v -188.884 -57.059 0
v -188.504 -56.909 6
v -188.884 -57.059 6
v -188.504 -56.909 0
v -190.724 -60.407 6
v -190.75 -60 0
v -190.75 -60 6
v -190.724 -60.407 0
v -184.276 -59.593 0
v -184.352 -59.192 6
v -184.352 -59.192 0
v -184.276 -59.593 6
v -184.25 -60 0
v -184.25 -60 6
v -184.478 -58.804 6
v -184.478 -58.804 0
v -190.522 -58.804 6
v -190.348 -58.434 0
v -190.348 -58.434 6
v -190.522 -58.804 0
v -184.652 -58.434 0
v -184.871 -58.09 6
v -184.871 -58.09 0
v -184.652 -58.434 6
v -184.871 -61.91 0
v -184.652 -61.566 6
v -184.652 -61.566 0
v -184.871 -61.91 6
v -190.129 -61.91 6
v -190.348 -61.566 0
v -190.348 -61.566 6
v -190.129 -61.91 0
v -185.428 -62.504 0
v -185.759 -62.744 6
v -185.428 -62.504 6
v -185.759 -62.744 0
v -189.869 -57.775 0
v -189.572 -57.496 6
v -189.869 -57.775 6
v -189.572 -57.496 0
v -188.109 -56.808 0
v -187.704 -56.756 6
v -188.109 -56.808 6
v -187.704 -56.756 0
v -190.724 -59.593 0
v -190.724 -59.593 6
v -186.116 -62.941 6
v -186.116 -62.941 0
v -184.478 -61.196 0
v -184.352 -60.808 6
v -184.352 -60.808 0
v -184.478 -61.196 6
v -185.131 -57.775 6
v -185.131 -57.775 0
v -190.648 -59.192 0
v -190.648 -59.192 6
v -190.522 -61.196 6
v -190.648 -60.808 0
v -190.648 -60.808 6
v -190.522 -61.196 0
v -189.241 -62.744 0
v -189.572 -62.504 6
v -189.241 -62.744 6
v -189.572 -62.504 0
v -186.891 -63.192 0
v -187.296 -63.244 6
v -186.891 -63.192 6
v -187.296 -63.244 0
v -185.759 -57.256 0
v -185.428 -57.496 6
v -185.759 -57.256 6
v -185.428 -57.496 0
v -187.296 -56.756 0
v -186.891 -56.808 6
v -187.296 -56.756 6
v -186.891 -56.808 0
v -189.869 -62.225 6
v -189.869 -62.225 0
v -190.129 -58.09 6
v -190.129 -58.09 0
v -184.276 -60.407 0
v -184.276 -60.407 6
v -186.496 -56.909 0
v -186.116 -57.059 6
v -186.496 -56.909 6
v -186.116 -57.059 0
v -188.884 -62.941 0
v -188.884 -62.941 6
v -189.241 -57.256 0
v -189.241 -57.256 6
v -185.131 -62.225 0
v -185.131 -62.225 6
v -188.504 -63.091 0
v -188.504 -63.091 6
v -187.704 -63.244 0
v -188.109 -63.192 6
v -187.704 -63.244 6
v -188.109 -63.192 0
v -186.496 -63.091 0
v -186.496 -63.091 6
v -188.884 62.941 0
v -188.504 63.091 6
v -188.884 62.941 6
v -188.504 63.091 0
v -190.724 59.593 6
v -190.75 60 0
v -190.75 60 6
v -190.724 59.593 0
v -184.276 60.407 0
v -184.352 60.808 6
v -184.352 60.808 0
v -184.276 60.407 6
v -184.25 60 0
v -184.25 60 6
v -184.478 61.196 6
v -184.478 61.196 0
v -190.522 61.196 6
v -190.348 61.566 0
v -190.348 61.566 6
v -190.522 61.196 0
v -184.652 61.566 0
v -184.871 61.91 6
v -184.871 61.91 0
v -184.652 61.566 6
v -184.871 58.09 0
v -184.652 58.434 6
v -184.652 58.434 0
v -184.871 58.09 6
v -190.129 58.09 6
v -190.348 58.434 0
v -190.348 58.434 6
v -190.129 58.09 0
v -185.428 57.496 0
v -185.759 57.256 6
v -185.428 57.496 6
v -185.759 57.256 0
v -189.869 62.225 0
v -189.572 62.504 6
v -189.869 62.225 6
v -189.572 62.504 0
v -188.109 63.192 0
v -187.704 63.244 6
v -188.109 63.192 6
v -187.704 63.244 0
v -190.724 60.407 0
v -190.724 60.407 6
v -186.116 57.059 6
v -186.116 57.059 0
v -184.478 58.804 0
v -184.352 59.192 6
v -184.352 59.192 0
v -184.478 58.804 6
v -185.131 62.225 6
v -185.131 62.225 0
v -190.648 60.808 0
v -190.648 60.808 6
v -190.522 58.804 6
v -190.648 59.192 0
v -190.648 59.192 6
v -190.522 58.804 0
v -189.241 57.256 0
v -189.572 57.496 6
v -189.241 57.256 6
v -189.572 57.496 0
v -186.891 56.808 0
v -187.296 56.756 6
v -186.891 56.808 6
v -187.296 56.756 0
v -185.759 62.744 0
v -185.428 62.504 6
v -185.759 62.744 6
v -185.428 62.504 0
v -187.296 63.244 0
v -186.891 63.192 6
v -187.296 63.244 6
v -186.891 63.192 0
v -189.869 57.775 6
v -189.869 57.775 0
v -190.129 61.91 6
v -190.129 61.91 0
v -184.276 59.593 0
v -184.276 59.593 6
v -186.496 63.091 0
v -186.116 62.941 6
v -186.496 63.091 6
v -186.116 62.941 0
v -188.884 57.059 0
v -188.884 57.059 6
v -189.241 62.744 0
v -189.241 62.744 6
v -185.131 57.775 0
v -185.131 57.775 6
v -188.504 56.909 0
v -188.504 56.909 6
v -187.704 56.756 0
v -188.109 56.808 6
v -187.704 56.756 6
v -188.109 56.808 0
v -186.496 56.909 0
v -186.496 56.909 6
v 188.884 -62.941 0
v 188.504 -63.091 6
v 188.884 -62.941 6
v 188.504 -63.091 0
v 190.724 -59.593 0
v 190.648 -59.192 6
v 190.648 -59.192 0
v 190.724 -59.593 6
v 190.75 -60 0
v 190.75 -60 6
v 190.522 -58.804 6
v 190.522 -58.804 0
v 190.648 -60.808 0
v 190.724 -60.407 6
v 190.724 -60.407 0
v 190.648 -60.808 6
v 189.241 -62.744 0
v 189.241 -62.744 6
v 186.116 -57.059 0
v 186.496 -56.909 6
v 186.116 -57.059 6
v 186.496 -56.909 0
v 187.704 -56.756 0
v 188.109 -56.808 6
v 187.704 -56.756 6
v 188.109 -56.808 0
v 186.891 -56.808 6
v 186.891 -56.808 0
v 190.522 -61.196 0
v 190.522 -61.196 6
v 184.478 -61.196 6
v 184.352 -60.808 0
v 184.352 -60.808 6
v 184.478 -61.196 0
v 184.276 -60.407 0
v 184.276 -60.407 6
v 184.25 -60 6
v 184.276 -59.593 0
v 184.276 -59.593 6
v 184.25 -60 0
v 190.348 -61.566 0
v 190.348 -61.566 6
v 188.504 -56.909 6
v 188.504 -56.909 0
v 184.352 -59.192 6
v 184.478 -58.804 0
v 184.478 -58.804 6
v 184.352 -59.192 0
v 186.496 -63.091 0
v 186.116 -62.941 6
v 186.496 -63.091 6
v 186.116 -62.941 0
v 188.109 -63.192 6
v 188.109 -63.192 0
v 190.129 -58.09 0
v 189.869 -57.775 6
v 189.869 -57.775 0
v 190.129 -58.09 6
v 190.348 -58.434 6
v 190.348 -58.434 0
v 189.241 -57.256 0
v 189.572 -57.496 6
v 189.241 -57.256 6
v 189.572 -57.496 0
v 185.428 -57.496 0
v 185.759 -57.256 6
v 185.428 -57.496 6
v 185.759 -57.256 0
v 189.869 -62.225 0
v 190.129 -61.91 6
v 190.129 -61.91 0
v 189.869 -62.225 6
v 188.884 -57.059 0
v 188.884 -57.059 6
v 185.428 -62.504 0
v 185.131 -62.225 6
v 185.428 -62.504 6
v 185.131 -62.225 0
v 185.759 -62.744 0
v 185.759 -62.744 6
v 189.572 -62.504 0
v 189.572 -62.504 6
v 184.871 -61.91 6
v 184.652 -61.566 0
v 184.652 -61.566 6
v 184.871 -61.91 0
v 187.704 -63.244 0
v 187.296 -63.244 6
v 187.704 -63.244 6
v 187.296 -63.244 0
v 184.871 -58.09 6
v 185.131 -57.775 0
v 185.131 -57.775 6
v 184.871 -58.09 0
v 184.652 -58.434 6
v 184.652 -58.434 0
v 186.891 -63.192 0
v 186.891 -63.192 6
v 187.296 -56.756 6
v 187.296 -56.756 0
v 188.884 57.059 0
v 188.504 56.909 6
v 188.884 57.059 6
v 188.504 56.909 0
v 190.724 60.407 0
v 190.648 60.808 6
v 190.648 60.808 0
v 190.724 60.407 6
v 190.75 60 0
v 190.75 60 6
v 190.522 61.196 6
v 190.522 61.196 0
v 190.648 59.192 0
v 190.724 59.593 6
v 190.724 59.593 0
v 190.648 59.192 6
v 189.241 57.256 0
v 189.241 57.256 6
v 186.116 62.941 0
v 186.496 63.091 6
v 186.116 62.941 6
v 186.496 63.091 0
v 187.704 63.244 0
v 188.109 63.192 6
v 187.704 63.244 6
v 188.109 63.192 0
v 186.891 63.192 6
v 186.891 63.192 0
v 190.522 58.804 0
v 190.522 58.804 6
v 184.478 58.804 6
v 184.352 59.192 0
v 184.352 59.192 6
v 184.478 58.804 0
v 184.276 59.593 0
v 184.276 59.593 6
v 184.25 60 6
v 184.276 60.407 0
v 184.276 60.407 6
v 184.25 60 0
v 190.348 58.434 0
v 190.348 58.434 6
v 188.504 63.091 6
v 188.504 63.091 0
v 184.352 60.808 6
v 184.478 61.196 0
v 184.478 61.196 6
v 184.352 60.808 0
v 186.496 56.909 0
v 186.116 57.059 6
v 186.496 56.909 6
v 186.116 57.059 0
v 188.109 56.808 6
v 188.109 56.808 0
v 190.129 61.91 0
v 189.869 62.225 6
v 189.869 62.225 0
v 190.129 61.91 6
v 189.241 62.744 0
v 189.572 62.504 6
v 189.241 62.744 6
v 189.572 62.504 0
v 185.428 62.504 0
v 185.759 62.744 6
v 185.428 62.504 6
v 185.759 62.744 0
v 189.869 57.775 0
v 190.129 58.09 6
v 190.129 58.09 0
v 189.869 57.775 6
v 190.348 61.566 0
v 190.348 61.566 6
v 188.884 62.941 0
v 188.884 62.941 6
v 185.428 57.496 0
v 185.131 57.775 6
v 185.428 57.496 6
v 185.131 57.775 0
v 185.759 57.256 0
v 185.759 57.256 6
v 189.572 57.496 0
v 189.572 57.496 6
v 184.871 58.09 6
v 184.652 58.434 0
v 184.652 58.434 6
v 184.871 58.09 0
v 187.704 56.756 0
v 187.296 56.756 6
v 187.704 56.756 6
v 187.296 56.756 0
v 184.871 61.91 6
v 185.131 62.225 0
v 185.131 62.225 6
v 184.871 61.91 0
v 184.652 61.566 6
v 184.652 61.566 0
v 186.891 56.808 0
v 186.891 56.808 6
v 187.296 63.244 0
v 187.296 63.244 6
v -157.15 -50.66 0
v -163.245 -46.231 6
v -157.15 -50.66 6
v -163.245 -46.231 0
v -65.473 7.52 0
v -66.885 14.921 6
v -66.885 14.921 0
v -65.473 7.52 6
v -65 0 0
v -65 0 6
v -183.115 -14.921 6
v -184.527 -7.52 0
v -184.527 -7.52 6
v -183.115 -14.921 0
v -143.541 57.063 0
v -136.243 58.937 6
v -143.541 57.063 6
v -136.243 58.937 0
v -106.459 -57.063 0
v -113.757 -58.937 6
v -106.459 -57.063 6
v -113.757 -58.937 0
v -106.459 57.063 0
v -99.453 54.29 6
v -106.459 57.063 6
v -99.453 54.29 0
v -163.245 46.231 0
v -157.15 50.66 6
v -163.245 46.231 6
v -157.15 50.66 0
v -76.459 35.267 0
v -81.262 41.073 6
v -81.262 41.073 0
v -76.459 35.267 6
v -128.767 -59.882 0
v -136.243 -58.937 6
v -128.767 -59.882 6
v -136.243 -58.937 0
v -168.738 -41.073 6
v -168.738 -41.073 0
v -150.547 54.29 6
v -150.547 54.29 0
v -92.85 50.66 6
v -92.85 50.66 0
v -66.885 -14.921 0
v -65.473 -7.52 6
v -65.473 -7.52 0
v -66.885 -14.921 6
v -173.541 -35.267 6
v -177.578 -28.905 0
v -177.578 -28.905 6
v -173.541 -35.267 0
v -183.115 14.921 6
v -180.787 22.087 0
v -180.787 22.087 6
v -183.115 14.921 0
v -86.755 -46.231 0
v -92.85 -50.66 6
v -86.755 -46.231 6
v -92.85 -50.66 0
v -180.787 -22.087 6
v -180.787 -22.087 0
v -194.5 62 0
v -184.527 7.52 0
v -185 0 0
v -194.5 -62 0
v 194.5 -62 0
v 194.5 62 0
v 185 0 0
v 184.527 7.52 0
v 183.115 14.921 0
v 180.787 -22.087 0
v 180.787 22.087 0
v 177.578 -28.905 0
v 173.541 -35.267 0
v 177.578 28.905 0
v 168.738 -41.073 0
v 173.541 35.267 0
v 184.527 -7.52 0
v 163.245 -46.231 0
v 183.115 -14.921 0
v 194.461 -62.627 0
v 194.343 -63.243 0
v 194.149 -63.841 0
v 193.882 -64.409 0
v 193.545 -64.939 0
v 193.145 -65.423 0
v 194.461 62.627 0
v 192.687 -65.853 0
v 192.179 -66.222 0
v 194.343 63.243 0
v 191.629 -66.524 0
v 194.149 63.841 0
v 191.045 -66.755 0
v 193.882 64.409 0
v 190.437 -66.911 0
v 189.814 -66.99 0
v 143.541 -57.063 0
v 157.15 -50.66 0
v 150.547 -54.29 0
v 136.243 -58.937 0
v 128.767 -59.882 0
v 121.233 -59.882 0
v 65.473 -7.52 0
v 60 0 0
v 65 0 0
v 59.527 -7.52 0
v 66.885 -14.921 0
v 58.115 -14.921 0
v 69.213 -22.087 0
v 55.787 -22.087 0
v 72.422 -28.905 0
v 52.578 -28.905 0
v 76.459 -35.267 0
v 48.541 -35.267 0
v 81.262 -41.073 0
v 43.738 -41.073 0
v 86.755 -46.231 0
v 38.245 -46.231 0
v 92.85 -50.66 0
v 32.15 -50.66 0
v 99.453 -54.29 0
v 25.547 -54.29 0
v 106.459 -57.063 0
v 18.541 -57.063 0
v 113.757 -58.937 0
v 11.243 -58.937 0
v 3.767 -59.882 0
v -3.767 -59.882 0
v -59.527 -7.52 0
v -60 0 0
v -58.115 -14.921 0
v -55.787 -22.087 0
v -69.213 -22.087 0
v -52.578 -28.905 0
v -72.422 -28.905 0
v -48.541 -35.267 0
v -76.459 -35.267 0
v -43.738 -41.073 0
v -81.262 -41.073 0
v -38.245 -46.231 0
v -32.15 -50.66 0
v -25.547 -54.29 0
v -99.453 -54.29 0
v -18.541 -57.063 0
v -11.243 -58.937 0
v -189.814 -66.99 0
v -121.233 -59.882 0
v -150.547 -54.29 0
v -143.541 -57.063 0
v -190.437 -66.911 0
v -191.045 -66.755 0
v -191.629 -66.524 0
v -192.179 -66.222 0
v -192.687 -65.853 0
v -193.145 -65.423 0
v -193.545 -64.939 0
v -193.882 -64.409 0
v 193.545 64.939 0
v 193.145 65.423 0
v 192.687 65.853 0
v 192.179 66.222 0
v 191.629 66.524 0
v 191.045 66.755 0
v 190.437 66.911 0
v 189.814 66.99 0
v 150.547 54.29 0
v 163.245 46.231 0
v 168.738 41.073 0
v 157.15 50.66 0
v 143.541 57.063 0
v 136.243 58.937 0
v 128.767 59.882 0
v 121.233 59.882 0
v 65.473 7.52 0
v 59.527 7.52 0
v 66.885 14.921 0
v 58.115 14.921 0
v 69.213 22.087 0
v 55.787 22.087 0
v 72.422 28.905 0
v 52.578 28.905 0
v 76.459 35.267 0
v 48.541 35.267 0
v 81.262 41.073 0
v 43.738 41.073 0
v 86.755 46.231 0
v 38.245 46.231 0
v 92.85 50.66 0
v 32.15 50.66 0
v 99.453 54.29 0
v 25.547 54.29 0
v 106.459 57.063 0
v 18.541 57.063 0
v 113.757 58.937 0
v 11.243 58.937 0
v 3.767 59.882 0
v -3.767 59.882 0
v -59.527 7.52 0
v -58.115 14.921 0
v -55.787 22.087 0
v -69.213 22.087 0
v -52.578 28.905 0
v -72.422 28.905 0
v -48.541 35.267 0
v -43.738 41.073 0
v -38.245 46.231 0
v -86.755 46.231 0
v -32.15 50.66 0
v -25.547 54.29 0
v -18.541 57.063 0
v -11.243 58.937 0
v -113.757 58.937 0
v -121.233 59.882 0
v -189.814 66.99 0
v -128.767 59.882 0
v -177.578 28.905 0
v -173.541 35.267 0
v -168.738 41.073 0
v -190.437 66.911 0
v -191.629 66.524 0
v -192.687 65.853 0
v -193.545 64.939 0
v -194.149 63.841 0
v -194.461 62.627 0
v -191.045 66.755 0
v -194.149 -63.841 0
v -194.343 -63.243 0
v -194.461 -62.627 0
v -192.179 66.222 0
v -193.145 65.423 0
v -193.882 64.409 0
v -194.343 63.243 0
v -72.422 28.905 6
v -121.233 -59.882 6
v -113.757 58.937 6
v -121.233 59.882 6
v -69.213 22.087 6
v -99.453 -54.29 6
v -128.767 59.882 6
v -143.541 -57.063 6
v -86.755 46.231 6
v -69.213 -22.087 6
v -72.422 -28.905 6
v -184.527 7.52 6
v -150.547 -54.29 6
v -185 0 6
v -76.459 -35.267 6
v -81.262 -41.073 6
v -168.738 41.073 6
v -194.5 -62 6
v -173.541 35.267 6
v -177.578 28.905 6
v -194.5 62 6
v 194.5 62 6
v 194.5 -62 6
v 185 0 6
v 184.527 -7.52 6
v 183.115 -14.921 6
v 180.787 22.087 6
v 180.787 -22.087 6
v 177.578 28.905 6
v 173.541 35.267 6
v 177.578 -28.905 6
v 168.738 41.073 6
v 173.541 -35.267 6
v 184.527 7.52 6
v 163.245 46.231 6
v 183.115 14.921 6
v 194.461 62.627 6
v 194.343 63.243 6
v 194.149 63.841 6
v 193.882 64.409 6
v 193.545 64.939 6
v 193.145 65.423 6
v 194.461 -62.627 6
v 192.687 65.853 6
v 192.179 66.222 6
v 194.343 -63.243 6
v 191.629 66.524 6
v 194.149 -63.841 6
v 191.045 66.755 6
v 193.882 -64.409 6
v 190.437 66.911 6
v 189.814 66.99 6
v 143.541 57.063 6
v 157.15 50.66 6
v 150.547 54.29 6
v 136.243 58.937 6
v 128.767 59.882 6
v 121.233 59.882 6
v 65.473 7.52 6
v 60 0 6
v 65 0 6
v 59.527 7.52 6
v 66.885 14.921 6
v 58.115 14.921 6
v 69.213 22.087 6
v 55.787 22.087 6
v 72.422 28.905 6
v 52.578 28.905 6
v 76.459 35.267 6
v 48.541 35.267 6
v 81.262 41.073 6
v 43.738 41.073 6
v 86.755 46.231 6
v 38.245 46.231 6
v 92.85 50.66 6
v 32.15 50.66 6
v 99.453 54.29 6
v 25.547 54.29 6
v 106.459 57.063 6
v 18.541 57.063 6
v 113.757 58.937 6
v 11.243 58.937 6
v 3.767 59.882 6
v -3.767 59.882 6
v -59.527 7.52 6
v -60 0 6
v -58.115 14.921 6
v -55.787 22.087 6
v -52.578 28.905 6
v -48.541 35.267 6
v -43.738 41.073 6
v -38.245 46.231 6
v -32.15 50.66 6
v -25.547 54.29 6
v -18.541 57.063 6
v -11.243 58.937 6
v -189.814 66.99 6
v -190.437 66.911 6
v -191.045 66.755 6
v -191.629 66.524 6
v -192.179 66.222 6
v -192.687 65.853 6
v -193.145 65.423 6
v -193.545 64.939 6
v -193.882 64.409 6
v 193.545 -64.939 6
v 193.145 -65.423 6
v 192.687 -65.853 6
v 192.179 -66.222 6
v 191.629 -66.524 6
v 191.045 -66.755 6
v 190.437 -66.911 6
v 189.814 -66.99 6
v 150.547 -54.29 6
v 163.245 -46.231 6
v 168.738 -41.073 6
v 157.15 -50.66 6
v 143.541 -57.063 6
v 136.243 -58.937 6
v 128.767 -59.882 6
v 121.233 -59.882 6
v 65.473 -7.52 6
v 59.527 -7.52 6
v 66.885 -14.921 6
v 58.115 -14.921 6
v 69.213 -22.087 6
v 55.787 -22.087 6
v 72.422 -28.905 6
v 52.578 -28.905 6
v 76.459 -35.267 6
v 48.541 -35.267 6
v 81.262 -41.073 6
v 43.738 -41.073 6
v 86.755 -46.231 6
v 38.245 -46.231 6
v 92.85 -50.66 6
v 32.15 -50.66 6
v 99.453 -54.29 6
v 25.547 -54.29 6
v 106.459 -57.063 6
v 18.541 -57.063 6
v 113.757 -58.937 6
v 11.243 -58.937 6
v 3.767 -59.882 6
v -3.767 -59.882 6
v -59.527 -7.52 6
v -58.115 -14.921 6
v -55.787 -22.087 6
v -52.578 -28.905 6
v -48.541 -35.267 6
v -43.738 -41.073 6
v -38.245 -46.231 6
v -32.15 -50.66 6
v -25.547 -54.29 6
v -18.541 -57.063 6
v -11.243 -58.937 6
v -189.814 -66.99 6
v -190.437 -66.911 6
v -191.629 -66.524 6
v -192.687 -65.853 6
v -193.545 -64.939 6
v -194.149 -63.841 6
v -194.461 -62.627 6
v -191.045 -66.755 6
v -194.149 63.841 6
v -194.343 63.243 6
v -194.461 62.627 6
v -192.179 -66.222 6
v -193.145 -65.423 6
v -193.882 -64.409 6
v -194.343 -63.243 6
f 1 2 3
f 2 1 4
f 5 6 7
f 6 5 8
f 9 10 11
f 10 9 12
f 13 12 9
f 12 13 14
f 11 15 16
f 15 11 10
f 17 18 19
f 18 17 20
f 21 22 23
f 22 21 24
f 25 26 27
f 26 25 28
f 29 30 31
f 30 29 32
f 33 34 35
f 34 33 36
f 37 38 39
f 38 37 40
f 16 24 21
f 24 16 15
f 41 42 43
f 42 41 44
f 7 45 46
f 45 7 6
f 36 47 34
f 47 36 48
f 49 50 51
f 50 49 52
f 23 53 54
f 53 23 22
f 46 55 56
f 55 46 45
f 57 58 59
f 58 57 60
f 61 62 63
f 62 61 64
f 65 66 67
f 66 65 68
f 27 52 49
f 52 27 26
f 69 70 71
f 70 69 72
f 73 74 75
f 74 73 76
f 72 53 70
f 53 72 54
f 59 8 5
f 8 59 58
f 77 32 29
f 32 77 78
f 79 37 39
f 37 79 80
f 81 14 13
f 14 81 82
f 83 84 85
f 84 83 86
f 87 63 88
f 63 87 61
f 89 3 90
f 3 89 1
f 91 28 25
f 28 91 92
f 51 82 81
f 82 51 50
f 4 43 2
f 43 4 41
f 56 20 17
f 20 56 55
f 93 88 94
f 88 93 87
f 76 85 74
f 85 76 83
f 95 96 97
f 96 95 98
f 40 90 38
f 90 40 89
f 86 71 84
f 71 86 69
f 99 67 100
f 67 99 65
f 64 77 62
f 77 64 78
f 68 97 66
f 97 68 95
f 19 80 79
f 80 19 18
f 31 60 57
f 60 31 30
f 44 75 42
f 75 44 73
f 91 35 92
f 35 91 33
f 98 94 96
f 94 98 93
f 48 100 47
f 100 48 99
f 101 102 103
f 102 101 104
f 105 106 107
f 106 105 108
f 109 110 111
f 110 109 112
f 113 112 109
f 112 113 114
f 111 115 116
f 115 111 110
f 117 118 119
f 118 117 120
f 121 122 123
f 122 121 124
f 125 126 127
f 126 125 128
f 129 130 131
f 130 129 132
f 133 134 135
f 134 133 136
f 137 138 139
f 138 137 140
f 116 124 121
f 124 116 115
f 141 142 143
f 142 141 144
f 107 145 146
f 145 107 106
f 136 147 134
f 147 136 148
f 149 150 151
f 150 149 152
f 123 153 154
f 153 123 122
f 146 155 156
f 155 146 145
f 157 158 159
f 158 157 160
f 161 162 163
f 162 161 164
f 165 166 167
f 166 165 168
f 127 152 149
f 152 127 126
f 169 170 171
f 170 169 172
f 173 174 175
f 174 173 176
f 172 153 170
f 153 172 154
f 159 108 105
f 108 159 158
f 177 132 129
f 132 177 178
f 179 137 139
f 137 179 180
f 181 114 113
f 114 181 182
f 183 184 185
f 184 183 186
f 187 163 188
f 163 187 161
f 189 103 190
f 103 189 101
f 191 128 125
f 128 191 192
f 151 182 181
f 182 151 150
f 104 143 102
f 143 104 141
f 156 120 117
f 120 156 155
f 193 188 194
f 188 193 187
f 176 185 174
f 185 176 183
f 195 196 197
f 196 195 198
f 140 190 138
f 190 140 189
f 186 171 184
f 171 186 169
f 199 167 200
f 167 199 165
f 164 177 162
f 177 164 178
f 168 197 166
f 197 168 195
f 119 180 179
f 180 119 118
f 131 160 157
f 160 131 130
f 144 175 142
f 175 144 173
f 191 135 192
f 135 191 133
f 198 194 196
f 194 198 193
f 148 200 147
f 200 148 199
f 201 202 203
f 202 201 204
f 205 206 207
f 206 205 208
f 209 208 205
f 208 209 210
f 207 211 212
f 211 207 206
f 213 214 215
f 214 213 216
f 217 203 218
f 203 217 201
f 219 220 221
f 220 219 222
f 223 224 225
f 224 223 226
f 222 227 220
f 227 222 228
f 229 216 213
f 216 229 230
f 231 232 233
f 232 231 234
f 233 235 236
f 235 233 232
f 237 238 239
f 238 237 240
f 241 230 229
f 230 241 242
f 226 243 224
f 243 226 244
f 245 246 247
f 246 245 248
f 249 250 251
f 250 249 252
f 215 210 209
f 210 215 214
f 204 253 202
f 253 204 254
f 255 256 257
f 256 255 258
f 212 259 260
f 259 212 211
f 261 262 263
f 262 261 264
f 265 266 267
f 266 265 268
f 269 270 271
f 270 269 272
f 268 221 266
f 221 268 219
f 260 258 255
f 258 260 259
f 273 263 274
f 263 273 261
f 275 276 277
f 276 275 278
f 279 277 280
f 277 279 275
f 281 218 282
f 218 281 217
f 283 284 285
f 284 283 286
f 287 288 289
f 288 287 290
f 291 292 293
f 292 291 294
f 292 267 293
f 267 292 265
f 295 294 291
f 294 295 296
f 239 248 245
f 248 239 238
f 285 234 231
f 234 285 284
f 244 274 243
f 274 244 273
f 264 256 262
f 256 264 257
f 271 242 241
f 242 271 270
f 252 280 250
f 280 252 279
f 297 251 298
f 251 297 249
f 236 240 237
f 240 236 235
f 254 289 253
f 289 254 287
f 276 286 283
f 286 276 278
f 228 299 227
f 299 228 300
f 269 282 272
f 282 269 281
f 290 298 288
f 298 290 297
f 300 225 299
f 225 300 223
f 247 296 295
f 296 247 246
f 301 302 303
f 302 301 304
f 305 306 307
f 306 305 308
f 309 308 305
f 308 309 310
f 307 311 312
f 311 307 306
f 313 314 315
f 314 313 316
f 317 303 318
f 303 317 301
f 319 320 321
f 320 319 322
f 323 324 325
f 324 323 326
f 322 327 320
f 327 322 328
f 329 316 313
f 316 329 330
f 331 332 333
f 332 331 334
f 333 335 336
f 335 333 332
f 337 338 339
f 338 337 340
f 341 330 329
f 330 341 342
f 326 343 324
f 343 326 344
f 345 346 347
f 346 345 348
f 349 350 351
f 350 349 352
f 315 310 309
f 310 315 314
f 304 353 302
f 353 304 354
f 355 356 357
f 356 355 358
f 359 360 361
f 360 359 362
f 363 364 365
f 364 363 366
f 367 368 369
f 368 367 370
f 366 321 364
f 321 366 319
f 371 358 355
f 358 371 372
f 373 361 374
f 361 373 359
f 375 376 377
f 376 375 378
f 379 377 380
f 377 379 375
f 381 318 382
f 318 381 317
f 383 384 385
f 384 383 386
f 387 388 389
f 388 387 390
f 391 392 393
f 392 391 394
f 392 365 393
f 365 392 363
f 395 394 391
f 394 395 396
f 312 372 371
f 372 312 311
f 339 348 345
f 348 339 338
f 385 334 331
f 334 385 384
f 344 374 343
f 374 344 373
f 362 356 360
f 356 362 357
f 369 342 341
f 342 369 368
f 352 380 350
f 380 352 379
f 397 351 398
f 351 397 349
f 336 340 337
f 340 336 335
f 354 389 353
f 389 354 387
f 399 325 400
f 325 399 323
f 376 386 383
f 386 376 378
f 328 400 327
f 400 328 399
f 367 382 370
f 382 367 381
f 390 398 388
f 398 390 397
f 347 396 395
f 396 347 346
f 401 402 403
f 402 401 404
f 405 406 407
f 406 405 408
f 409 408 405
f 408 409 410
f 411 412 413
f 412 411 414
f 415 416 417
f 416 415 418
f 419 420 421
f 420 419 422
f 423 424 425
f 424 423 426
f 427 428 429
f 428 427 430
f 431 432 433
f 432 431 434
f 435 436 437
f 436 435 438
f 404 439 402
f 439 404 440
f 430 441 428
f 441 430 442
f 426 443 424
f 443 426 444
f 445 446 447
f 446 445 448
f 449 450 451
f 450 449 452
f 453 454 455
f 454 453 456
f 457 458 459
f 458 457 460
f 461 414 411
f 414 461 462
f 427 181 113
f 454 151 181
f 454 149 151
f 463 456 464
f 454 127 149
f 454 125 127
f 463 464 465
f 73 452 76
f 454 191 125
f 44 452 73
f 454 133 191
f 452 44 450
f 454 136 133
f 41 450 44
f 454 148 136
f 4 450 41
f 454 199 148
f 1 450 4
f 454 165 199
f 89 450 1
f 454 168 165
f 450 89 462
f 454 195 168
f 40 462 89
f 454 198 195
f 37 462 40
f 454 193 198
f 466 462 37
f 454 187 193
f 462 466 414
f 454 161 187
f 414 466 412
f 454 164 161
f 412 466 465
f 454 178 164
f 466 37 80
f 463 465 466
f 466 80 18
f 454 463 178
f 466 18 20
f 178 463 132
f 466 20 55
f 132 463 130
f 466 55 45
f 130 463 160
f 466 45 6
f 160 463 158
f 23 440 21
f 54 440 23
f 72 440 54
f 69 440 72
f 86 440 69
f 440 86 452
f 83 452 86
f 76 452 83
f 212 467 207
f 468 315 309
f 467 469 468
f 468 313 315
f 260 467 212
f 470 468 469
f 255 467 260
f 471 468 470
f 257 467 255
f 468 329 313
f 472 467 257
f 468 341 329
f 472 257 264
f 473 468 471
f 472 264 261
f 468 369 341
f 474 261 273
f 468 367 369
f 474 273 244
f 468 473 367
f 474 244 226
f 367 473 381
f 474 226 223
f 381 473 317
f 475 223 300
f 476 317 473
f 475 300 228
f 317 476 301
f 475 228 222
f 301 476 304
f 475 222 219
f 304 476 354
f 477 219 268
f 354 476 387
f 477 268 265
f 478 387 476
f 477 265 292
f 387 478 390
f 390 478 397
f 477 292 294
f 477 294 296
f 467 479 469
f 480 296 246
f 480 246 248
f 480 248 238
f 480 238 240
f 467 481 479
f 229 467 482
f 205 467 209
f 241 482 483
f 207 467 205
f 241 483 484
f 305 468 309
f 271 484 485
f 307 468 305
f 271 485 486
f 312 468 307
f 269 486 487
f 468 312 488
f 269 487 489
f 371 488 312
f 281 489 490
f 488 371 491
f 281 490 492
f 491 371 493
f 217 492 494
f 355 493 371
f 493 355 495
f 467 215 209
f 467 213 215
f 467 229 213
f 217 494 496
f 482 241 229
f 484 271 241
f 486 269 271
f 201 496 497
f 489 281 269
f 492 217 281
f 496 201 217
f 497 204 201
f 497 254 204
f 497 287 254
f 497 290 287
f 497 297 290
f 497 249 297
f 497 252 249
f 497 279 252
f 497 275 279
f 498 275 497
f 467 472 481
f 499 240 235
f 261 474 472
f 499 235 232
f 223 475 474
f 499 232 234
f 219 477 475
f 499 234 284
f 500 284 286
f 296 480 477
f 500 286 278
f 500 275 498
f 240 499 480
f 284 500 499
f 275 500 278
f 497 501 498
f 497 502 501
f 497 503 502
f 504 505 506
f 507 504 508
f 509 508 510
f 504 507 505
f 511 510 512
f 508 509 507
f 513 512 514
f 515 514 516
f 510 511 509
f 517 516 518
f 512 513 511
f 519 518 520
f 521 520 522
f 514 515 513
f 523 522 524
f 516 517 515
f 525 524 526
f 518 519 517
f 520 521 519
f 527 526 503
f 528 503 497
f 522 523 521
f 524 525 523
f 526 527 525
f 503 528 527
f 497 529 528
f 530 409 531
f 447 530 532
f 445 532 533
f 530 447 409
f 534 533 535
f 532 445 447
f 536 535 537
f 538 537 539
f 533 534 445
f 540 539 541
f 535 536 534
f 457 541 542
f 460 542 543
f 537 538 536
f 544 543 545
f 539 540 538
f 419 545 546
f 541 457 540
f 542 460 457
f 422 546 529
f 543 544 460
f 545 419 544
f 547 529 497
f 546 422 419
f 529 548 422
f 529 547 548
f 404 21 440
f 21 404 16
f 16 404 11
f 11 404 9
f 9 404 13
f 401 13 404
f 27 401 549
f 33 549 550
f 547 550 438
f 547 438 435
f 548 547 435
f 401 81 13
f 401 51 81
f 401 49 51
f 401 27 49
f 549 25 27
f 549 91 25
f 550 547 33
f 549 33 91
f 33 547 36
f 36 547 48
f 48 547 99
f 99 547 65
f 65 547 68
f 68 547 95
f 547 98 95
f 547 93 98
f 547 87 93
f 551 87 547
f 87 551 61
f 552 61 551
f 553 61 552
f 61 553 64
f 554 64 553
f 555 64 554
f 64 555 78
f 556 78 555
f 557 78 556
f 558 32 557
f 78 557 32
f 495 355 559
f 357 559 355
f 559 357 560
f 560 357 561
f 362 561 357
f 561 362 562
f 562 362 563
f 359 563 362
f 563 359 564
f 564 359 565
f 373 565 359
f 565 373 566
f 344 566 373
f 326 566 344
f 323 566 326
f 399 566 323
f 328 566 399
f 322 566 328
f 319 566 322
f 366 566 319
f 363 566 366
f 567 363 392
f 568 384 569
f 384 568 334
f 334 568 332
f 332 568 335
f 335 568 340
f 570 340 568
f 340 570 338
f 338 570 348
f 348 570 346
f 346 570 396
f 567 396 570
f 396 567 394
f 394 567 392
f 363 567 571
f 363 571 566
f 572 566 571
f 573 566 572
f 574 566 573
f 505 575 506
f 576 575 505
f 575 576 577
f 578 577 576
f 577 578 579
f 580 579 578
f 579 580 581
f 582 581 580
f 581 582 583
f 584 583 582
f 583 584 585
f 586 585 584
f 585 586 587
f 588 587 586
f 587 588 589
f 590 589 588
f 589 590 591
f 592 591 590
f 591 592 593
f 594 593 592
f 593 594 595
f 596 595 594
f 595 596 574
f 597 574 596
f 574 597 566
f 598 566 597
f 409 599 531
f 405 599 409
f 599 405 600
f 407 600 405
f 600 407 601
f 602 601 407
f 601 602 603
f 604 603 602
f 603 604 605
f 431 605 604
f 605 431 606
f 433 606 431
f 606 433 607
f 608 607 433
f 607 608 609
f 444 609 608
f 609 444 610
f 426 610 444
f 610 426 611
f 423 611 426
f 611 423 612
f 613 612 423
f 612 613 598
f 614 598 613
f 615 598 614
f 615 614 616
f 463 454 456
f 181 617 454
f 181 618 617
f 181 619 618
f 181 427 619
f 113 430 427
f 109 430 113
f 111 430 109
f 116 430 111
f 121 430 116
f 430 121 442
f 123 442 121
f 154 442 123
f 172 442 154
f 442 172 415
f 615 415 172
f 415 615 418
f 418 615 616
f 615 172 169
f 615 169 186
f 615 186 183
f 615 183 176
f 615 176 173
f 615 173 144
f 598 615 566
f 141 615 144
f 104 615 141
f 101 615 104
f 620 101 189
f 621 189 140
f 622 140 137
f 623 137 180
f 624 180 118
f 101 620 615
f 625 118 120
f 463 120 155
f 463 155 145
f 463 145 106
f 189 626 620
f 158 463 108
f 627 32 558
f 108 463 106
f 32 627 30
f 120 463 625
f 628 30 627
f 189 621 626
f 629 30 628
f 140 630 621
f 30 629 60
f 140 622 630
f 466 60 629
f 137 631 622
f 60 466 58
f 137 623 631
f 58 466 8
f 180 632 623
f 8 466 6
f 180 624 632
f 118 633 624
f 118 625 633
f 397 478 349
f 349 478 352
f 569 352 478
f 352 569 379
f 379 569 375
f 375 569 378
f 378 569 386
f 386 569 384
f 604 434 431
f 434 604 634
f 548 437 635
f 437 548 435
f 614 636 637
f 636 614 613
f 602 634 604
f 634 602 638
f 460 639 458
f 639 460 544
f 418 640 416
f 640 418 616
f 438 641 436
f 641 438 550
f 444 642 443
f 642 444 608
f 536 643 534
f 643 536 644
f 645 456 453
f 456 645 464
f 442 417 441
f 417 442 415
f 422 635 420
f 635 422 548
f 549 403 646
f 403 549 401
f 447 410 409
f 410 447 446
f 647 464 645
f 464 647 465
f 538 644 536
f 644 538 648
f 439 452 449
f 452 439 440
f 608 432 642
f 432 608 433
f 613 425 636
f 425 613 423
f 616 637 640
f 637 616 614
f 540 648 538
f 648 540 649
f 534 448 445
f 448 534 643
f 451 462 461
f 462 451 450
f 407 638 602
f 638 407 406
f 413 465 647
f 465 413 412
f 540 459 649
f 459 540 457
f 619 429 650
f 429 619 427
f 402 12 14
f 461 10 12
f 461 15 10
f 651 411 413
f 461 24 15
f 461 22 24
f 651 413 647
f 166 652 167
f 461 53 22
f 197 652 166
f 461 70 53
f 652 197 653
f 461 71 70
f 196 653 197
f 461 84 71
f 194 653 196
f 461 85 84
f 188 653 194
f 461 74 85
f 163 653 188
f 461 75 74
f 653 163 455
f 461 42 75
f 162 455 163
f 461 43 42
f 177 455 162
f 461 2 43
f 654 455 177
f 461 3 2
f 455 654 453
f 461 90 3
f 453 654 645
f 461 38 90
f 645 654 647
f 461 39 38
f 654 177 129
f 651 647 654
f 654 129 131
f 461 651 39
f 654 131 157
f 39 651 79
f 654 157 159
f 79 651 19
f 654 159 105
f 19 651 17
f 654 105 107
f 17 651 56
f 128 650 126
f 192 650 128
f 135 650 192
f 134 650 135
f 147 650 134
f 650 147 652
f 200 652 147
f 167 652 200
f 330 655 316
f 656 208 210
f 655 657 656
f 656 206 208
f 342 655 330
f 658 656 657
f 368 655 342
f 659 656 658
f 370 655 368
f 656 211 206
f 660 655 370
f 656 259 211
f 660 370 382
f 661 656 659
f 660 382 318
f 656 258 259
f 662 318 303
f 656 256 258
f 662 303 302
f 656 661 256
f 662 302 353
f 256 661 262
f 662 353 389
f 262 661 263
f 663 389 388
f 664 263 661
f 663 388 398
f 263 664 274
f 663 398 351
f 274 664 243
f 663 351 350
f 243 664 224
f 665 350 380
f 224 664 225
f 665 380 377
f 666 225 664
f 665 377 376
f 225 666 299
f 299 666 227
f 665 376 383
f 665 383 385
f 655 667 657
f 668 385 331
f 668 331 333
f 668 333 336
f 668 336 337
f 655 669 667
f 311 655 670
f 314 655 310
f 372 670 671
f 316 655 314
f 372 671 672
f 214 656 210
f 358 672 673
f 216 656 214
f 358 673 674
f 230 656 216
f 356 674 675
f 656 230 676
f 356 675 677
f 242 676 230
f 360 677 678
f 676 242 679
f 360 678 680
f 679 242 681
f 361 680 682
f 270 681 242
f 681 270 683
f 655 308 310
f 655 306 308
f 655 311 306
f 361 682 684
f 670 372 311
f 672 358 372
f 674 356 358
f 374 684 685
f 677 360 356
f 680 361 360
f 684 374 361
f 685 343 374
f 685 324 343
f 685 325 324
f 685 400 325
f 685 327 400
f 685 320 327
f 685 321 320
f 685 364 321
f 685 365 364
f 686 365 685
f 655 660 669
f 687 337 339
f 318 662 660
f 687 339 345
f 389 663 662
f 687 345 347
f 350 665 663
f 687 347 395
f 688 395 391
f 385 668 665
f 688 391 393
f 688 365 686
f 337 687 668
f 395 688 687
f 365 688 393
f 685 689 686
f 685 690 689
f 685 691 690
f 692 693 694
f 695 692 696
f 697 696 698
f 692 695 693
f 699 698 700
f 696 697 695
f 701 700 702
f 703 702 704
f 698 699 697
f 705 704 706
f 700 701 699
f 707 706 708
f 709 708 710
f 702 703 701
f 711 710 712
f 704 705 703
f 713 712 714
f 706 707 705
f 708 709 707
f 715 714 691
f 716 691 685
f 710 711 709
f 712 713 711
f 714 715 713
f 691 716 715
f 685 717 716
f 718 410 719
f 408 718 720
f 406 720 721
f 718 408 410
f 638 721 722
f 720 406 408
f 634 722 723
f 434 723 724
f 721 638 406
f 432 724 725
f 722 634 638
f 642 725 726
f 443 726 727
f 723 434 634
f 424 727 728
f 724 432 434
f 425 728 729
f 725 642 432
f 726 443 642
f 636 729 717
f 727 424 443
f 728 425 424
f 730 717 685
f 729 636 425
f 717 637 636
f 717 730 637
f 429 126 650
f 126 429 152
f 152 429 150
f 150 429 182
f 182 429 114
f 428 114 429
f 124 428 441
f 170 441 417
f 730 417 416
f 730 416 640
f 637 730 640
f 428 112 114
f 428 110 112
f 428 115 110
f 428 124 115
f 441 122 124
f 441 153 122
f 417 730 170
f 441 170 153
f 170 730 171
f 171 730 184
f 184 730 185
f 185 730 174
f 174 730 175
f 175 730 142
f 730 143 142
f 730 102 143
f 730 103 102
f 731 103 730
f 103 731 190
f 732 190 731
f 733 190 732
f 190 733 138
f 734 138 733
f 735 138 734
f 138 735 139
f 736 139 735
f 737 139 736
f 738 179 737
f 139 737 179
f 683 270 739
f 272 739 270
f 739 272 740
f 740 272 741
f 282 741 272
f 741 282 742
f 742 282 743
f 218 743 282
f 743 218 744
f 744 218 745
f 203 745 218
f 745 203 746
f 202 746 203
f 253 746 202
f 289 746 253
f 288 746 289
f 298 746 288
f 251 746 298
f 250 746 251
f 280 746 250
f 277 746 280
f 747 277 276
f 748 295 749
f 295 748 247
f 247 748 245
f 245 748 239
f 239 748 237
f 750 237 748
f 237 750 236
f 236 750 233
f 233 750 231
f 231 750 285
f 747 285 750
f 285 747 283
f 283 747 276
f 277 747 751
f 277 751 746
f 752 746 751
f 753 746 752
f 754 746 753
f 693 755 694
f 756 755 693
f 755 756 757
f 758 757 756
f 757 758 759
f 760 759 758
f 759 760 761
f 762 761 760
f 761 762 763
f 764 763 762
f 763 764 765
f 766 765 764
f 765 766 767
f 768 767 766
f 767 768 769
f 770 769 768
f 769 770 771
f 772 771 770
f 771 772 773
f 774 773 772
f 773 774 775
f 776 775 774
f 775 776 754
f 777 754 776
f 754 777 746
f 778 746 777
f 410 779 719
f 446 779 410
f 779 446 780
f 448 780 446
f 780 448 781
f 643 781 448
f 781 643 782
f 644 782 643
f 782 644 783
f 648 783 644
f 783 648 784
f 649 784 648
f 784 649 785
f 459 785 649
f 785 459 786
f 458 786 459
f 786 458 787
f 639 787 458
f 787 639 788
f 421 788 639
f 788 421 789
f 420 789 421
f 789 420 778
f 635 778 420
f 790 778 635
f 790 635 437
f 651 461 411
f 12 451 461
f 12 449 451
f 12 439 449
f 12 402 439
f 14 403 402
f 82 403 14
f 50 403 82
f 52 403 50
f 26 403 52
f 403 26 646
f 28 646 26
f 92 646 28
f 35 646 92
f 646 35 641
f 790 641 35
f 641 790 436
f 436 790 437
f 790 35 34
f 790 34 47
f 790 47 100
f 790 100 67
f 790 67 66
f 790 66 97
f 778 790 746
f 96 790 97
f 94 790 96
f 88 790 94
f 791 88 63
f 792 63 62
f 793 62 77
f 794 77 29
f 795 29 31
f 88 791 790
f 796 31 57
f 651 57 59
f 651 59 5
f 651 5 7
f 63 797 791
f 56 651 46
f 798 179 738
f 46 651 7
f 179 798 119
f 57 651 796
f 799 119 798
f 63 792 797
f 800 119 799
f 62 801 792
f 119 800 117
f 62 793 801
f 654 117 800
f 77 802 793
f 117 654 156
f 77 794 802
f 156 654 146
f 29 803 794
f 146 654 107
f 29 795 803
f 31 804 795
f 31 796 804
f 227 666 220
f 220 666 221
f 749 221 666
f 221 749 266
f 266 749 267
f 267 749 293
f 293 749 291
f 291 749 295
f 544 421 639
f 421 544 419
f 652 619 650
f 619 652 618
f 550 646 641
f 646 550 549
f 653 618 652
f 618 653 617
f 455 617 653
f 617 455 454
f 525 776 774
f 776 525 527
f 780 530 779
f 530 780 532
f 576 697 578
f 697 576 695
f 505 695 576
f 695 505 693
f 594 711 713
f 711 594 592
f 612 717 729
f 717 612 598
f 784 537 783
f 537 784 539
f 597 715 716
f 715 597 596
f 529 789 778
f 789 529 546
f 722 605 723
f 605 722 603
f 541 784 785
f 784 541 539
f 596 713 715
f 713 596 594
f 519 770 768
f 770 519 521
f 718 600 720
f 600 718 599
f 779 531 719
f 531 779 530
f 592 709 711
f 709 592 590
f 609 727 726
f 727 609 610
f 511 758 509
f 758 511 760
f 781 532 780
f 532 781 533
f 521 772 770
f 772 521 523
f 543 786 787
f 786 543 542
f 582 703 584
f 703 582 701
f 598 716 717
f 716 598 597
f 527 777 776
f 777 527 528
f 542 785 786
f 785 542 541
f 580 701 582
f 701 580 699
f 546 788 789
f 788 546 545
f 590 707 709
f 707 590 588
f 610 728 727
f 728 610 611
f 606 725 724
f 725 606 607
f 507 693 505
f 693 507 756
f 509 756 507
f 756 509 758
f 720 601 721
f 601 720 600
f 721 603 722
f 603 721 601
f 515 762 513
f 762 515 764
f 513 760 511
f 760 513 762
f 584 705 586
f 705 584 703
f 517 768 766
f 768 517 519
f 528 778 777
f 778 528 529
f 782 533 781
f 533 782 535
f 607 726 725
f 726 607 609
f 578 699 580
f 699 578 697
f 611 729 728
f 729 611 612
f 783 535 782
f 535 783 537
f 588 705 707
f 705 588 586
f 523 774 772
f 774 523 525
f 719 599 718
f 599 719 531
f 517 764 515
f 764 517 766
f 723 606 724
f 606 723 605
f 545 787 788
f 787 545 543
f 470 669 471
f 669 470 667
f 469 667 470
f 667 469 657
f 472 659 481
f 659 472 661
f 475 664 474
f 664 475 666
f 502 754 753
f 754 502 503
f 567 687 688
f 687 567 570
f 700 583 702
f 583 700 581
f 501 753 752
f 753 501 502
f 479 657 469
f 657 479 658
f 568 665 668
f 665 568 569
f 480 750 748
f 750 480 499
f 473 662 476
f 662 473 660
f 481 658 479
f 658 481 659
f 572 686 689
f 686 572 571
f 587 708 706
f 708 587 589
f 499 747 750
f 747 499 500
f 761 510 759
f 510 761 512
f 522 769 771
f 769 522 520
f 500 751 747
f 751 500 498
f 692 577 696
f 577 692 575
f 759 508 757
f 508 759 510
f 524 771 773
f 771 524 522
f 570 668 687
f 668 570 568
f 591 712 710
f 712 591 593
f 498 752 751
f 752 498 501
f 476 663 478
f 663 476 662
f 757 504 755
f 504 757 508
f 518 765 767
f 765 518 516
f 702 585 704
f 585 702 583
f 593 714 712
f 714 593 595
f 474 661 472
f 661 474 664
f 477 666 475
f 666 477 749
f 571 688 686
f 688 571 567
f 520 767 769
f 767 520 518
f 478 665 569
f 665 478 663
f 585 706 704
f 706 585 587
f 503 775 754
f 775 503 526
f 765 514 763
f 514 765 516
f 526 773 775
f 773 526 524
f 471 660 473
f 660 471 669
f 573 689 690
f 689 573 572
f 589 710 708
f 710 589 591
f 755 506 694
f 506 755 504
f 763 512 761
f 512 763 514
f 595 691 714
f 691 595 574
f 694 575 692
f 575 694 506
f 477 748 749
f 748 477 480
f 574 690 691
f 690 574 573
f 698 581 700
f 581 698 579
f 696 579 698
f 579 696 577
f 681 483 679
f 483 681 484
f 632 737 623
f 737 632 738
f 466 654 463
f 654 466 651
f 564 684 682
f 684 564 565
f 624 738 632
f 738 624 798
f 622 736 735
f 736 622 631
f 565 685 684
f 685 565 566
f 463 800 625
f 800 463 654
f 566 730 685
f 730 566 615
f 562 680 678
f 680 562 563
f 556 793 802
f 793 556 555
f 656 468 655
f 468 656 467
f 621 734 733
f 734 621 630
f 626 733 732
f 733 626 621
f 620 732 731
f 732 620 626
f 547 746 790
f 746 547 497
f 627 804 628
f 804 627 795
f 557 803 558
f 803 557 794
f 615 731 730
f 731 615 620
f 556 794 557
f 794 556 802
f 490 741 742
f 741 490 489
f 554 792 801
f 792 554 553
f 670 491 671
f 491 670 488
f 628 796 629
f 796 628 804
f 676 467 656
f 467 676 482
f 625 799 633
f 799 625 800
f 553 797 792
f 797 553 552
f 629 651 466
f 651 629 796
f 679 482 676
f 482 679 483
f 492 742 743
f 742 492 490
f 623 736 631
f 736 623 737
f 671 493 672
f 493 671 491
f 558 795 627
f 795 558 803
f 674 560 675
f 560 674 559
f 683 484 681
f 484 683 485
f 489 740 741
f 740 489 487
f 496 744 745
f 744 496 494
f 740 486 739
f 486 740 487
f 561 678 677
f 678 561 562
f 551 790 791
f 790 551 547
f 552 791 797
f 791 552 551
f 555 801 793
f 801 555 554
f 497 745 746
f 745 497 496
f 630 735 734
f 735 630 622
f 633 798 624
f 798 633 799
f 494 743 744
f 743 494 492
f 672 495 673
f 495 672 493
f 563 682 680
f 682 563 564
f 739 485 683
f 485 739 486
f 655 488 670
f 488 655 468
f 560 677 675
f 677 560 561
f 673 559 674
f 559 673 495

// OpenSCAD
$fn = 50;


difference() {
	union() {
		hull() {
			translate(v = [-189.5000000000, 62.0000000000, 0]) {
				cylinder(h = 6, r = 5);
			}
			translate(v = [189.5000000000, 62.0000000000, 0]) {
				cylinder(h = 6, r = 5);
			}
			translate(v = [-189.5000000000, -62.0000000000, 0]) {
				cylinder(h = 6, r = 5);
			}
			translate(v = [189.5000000000, -62.0000000000, 0]) {
				cylinder(h = 6, r = 5);
			}
		}
	}
	union() {
		#translate(v = [-187.5000000000, -60.0000000000, -100.0000000000]) {
			cylinder(h = 200, r = 3.2500000000);
		}
		#translate(v = [-187.5000000000, 60.0000000000, -100.0000000000]) {
			cylinder(h = 200, r = 3.2500000000);
		}
		#translate(v = [187.5000000000, -60.0000000000, -100.0000000000]) {
			cylinder(h = 200, r = 3.2500000000);
		}
		#translate(v = [187.5000000000, 60.0000000000, -100.0000000000]) {
			cylinder(h = 200, r = 3.2500000000);
		}
		#translate(v = [-125.0000000000, 0, 0]) {
			cylinder(h = 6, r = 60.0000000000);
		}
		#cylinder(h = 6, r = 60.0000000000);
		#translate(v = [125.0000000000, 0, 0]) {
			cylinder(h = 6, r = 60.0000000000);
		}
	}
}
